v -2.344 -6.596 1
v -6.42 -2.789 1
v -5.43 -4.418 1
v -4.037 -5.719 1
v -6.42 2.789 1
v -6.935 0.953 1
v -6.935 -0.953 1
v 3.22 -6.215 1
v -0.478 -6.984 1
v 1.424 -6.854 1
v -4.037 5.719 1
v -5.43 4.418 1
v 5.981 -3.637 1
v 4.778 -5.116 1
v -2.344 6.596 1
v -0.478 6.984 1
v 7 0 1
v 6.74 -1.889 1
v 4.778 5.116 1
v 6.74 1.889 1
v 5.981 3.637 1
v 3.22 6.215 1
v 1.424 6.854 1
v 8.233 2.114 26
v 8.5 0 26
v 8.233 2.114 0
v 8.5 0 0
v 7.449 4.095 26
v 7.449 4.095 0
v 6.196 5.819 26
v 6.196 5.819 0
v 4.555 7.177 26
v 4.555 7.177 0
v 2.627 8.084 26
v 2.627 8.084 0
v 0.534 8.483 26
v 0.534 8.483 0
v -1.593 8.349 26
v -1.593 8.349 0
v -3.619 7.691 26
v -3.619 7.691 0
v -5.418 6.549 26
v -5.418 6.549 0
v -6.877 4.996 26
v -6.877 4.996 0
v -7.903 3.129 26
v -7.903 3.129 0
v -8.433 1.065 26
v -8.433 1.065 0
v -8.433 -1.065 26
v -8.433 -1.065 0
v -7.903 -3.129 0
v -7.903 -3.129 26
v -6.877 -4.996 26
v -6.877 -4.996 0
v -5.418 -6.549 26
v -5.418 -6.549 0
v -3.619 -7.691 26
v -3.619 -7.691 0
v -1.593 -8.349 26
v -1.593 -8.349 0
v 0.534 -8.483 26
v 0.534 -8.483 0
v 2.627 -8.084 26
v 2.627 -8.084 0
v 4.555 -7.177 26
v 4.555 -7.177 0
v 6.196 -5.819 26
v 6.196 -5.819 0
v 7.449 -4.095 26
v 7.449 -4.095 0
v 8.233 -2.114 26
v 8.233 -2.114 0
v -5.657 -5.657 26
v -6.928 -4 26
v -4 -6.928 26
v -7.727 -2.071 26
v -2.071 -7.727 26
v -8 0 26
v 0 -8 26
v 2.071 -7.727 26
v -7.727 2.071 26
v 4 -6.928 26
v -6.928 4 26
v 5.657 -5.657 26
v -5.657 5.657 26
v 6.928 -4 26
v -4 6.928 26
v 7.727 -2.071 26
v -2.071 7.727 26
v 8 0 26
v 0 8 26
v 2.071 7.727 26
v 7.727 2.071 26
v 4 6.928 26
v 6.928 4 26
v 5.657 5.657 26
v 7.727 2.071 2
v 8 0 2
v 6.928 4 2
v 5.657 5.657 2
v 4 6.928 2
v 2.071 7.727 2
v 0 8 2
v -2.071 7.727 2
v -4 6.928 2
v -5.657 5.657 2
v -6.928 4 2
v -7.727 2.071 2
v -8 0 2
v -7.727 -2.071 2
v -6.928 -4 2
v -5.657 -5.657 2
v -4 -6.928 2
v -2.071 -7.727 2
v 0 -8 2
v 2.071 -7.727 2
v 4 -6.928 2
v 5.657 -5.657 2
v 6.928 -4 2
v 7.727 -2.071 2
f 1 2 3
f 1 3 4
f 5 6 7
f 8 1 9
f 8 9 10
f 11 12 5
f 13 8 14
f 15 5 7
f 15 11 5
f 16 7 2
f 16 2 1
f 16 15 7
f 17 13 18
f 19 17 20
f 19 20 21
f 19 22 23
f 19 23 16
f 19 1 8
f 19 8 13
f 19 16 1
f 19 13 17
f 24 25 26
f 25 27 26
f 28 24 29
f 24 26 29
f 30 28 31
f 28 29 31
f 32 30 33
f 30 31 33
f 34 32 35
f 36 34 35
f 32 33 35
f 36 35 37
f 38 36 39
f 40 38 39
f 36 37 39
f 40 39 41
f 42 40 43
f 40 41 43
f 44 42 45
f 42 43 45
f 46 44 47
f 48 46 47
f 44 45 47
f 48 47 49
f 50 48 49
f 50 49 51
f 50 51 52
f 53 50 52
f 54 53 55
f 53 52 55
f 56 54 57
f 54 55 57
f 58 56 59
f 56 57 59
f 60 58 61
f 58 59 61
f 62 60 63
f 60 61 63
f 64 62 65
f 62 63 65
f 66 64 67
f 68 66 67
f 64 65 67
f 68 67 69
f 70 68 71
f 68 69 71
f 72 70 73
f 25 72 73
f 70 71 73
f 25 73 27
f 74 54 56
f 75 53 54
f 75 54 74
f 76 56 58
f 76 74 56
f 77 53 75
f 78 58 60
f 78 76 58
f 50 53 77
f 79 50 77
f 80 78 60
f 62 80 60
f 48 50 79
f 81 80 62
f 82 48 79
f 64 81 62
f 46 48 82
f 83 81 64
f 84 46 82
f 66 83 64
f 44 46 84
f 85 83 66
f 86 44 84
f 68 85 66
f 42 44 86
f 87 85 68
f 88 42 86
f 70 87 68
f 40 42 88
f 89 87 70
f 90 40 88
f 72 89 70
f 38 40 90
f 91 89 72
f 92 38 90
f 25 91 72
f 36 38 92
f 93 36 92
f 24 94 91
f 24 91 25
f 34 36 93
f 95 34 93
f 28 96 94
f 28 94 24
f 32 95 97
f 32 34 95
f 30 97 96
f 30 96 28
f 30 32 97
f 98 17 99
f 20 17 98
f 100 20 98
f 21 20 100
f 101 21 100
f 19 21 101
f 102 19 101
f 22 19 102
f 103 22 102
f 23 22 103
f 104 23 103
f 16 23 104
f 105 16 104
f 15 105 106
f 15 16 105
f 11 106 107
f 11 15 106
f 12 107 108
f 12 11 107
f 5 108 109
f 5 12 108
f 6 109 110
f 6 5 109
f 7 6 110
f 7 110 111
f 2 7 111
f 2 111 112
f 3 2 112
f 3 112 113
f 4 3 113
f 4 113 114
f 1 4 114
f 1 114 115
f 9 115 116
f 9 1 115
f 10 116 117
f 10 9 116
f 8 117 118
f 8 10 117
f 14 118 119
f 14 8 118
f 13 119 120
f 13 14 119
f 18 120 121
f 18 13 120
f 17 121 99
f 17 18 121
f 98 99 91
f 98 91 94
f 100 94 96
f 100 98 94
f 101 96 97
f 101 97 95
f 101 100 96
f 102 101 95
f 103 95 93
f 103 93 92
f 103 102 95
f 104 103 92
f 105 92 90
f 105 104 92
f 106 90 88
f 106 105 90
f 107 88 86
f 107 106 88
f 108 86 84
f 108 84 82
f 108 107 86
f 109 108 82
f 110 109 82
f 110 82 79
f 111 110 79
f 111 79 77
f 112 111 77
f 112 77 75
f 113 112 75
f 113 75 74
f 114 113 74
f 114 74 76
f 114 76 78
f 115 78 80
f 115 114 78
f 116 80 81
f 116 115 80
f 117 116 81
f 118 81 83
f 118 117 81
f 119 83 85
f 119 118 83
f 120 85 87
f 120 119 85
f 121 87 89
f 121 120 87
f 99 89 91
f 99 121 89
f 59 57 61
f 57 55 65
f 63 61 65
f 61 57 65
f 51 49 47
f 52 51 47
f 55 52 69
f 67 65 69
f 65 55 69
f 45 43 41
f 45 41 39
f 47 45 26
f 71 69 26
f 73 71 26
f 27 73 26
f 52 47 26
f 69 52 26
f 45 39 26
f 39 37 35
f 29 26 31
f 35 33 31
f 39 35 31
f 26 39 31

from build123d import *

# Parameters (mm, degrees)
SKETCH1_R           = 8.5
BOSS_EXTRUDE1_DEPTH = 1
SKETCH2_R           = 8.5
SKETCH2_R_2         = 8
BOSS_EXTRUDE2_DEPTH = 25
CHAMFER1_SIZE       = 1


with BuildPart() as part:
    # Sketch1 → Boss-Extrude1 (new body)
    with BuildSketch(Plane.XY):
        Circle(SKETCH1_R)
    extrude(amount=BOSS_EXTRUDE1_DEPTH)

    # Sketch2 → Boss-Extrude2 (add)
    with BuildSketch(Plane.XY.offset(1)):
        Circle(SKETCH2_R)
        Circle(SKETCH2_R_2, mode=Mode.SUBTRACT)
    extrude(amount=BOSS_EXTRUDE2_DEPTH)

    # Chamfer1
    chamfer1_edges = [part.edges().sort_by_distance(p)[0] for p in [
        (-8, 0, 1),
    ]]
    chamfer(chamfer1_edges, length=CHAMFER1_SIZE)


solid = part.part
